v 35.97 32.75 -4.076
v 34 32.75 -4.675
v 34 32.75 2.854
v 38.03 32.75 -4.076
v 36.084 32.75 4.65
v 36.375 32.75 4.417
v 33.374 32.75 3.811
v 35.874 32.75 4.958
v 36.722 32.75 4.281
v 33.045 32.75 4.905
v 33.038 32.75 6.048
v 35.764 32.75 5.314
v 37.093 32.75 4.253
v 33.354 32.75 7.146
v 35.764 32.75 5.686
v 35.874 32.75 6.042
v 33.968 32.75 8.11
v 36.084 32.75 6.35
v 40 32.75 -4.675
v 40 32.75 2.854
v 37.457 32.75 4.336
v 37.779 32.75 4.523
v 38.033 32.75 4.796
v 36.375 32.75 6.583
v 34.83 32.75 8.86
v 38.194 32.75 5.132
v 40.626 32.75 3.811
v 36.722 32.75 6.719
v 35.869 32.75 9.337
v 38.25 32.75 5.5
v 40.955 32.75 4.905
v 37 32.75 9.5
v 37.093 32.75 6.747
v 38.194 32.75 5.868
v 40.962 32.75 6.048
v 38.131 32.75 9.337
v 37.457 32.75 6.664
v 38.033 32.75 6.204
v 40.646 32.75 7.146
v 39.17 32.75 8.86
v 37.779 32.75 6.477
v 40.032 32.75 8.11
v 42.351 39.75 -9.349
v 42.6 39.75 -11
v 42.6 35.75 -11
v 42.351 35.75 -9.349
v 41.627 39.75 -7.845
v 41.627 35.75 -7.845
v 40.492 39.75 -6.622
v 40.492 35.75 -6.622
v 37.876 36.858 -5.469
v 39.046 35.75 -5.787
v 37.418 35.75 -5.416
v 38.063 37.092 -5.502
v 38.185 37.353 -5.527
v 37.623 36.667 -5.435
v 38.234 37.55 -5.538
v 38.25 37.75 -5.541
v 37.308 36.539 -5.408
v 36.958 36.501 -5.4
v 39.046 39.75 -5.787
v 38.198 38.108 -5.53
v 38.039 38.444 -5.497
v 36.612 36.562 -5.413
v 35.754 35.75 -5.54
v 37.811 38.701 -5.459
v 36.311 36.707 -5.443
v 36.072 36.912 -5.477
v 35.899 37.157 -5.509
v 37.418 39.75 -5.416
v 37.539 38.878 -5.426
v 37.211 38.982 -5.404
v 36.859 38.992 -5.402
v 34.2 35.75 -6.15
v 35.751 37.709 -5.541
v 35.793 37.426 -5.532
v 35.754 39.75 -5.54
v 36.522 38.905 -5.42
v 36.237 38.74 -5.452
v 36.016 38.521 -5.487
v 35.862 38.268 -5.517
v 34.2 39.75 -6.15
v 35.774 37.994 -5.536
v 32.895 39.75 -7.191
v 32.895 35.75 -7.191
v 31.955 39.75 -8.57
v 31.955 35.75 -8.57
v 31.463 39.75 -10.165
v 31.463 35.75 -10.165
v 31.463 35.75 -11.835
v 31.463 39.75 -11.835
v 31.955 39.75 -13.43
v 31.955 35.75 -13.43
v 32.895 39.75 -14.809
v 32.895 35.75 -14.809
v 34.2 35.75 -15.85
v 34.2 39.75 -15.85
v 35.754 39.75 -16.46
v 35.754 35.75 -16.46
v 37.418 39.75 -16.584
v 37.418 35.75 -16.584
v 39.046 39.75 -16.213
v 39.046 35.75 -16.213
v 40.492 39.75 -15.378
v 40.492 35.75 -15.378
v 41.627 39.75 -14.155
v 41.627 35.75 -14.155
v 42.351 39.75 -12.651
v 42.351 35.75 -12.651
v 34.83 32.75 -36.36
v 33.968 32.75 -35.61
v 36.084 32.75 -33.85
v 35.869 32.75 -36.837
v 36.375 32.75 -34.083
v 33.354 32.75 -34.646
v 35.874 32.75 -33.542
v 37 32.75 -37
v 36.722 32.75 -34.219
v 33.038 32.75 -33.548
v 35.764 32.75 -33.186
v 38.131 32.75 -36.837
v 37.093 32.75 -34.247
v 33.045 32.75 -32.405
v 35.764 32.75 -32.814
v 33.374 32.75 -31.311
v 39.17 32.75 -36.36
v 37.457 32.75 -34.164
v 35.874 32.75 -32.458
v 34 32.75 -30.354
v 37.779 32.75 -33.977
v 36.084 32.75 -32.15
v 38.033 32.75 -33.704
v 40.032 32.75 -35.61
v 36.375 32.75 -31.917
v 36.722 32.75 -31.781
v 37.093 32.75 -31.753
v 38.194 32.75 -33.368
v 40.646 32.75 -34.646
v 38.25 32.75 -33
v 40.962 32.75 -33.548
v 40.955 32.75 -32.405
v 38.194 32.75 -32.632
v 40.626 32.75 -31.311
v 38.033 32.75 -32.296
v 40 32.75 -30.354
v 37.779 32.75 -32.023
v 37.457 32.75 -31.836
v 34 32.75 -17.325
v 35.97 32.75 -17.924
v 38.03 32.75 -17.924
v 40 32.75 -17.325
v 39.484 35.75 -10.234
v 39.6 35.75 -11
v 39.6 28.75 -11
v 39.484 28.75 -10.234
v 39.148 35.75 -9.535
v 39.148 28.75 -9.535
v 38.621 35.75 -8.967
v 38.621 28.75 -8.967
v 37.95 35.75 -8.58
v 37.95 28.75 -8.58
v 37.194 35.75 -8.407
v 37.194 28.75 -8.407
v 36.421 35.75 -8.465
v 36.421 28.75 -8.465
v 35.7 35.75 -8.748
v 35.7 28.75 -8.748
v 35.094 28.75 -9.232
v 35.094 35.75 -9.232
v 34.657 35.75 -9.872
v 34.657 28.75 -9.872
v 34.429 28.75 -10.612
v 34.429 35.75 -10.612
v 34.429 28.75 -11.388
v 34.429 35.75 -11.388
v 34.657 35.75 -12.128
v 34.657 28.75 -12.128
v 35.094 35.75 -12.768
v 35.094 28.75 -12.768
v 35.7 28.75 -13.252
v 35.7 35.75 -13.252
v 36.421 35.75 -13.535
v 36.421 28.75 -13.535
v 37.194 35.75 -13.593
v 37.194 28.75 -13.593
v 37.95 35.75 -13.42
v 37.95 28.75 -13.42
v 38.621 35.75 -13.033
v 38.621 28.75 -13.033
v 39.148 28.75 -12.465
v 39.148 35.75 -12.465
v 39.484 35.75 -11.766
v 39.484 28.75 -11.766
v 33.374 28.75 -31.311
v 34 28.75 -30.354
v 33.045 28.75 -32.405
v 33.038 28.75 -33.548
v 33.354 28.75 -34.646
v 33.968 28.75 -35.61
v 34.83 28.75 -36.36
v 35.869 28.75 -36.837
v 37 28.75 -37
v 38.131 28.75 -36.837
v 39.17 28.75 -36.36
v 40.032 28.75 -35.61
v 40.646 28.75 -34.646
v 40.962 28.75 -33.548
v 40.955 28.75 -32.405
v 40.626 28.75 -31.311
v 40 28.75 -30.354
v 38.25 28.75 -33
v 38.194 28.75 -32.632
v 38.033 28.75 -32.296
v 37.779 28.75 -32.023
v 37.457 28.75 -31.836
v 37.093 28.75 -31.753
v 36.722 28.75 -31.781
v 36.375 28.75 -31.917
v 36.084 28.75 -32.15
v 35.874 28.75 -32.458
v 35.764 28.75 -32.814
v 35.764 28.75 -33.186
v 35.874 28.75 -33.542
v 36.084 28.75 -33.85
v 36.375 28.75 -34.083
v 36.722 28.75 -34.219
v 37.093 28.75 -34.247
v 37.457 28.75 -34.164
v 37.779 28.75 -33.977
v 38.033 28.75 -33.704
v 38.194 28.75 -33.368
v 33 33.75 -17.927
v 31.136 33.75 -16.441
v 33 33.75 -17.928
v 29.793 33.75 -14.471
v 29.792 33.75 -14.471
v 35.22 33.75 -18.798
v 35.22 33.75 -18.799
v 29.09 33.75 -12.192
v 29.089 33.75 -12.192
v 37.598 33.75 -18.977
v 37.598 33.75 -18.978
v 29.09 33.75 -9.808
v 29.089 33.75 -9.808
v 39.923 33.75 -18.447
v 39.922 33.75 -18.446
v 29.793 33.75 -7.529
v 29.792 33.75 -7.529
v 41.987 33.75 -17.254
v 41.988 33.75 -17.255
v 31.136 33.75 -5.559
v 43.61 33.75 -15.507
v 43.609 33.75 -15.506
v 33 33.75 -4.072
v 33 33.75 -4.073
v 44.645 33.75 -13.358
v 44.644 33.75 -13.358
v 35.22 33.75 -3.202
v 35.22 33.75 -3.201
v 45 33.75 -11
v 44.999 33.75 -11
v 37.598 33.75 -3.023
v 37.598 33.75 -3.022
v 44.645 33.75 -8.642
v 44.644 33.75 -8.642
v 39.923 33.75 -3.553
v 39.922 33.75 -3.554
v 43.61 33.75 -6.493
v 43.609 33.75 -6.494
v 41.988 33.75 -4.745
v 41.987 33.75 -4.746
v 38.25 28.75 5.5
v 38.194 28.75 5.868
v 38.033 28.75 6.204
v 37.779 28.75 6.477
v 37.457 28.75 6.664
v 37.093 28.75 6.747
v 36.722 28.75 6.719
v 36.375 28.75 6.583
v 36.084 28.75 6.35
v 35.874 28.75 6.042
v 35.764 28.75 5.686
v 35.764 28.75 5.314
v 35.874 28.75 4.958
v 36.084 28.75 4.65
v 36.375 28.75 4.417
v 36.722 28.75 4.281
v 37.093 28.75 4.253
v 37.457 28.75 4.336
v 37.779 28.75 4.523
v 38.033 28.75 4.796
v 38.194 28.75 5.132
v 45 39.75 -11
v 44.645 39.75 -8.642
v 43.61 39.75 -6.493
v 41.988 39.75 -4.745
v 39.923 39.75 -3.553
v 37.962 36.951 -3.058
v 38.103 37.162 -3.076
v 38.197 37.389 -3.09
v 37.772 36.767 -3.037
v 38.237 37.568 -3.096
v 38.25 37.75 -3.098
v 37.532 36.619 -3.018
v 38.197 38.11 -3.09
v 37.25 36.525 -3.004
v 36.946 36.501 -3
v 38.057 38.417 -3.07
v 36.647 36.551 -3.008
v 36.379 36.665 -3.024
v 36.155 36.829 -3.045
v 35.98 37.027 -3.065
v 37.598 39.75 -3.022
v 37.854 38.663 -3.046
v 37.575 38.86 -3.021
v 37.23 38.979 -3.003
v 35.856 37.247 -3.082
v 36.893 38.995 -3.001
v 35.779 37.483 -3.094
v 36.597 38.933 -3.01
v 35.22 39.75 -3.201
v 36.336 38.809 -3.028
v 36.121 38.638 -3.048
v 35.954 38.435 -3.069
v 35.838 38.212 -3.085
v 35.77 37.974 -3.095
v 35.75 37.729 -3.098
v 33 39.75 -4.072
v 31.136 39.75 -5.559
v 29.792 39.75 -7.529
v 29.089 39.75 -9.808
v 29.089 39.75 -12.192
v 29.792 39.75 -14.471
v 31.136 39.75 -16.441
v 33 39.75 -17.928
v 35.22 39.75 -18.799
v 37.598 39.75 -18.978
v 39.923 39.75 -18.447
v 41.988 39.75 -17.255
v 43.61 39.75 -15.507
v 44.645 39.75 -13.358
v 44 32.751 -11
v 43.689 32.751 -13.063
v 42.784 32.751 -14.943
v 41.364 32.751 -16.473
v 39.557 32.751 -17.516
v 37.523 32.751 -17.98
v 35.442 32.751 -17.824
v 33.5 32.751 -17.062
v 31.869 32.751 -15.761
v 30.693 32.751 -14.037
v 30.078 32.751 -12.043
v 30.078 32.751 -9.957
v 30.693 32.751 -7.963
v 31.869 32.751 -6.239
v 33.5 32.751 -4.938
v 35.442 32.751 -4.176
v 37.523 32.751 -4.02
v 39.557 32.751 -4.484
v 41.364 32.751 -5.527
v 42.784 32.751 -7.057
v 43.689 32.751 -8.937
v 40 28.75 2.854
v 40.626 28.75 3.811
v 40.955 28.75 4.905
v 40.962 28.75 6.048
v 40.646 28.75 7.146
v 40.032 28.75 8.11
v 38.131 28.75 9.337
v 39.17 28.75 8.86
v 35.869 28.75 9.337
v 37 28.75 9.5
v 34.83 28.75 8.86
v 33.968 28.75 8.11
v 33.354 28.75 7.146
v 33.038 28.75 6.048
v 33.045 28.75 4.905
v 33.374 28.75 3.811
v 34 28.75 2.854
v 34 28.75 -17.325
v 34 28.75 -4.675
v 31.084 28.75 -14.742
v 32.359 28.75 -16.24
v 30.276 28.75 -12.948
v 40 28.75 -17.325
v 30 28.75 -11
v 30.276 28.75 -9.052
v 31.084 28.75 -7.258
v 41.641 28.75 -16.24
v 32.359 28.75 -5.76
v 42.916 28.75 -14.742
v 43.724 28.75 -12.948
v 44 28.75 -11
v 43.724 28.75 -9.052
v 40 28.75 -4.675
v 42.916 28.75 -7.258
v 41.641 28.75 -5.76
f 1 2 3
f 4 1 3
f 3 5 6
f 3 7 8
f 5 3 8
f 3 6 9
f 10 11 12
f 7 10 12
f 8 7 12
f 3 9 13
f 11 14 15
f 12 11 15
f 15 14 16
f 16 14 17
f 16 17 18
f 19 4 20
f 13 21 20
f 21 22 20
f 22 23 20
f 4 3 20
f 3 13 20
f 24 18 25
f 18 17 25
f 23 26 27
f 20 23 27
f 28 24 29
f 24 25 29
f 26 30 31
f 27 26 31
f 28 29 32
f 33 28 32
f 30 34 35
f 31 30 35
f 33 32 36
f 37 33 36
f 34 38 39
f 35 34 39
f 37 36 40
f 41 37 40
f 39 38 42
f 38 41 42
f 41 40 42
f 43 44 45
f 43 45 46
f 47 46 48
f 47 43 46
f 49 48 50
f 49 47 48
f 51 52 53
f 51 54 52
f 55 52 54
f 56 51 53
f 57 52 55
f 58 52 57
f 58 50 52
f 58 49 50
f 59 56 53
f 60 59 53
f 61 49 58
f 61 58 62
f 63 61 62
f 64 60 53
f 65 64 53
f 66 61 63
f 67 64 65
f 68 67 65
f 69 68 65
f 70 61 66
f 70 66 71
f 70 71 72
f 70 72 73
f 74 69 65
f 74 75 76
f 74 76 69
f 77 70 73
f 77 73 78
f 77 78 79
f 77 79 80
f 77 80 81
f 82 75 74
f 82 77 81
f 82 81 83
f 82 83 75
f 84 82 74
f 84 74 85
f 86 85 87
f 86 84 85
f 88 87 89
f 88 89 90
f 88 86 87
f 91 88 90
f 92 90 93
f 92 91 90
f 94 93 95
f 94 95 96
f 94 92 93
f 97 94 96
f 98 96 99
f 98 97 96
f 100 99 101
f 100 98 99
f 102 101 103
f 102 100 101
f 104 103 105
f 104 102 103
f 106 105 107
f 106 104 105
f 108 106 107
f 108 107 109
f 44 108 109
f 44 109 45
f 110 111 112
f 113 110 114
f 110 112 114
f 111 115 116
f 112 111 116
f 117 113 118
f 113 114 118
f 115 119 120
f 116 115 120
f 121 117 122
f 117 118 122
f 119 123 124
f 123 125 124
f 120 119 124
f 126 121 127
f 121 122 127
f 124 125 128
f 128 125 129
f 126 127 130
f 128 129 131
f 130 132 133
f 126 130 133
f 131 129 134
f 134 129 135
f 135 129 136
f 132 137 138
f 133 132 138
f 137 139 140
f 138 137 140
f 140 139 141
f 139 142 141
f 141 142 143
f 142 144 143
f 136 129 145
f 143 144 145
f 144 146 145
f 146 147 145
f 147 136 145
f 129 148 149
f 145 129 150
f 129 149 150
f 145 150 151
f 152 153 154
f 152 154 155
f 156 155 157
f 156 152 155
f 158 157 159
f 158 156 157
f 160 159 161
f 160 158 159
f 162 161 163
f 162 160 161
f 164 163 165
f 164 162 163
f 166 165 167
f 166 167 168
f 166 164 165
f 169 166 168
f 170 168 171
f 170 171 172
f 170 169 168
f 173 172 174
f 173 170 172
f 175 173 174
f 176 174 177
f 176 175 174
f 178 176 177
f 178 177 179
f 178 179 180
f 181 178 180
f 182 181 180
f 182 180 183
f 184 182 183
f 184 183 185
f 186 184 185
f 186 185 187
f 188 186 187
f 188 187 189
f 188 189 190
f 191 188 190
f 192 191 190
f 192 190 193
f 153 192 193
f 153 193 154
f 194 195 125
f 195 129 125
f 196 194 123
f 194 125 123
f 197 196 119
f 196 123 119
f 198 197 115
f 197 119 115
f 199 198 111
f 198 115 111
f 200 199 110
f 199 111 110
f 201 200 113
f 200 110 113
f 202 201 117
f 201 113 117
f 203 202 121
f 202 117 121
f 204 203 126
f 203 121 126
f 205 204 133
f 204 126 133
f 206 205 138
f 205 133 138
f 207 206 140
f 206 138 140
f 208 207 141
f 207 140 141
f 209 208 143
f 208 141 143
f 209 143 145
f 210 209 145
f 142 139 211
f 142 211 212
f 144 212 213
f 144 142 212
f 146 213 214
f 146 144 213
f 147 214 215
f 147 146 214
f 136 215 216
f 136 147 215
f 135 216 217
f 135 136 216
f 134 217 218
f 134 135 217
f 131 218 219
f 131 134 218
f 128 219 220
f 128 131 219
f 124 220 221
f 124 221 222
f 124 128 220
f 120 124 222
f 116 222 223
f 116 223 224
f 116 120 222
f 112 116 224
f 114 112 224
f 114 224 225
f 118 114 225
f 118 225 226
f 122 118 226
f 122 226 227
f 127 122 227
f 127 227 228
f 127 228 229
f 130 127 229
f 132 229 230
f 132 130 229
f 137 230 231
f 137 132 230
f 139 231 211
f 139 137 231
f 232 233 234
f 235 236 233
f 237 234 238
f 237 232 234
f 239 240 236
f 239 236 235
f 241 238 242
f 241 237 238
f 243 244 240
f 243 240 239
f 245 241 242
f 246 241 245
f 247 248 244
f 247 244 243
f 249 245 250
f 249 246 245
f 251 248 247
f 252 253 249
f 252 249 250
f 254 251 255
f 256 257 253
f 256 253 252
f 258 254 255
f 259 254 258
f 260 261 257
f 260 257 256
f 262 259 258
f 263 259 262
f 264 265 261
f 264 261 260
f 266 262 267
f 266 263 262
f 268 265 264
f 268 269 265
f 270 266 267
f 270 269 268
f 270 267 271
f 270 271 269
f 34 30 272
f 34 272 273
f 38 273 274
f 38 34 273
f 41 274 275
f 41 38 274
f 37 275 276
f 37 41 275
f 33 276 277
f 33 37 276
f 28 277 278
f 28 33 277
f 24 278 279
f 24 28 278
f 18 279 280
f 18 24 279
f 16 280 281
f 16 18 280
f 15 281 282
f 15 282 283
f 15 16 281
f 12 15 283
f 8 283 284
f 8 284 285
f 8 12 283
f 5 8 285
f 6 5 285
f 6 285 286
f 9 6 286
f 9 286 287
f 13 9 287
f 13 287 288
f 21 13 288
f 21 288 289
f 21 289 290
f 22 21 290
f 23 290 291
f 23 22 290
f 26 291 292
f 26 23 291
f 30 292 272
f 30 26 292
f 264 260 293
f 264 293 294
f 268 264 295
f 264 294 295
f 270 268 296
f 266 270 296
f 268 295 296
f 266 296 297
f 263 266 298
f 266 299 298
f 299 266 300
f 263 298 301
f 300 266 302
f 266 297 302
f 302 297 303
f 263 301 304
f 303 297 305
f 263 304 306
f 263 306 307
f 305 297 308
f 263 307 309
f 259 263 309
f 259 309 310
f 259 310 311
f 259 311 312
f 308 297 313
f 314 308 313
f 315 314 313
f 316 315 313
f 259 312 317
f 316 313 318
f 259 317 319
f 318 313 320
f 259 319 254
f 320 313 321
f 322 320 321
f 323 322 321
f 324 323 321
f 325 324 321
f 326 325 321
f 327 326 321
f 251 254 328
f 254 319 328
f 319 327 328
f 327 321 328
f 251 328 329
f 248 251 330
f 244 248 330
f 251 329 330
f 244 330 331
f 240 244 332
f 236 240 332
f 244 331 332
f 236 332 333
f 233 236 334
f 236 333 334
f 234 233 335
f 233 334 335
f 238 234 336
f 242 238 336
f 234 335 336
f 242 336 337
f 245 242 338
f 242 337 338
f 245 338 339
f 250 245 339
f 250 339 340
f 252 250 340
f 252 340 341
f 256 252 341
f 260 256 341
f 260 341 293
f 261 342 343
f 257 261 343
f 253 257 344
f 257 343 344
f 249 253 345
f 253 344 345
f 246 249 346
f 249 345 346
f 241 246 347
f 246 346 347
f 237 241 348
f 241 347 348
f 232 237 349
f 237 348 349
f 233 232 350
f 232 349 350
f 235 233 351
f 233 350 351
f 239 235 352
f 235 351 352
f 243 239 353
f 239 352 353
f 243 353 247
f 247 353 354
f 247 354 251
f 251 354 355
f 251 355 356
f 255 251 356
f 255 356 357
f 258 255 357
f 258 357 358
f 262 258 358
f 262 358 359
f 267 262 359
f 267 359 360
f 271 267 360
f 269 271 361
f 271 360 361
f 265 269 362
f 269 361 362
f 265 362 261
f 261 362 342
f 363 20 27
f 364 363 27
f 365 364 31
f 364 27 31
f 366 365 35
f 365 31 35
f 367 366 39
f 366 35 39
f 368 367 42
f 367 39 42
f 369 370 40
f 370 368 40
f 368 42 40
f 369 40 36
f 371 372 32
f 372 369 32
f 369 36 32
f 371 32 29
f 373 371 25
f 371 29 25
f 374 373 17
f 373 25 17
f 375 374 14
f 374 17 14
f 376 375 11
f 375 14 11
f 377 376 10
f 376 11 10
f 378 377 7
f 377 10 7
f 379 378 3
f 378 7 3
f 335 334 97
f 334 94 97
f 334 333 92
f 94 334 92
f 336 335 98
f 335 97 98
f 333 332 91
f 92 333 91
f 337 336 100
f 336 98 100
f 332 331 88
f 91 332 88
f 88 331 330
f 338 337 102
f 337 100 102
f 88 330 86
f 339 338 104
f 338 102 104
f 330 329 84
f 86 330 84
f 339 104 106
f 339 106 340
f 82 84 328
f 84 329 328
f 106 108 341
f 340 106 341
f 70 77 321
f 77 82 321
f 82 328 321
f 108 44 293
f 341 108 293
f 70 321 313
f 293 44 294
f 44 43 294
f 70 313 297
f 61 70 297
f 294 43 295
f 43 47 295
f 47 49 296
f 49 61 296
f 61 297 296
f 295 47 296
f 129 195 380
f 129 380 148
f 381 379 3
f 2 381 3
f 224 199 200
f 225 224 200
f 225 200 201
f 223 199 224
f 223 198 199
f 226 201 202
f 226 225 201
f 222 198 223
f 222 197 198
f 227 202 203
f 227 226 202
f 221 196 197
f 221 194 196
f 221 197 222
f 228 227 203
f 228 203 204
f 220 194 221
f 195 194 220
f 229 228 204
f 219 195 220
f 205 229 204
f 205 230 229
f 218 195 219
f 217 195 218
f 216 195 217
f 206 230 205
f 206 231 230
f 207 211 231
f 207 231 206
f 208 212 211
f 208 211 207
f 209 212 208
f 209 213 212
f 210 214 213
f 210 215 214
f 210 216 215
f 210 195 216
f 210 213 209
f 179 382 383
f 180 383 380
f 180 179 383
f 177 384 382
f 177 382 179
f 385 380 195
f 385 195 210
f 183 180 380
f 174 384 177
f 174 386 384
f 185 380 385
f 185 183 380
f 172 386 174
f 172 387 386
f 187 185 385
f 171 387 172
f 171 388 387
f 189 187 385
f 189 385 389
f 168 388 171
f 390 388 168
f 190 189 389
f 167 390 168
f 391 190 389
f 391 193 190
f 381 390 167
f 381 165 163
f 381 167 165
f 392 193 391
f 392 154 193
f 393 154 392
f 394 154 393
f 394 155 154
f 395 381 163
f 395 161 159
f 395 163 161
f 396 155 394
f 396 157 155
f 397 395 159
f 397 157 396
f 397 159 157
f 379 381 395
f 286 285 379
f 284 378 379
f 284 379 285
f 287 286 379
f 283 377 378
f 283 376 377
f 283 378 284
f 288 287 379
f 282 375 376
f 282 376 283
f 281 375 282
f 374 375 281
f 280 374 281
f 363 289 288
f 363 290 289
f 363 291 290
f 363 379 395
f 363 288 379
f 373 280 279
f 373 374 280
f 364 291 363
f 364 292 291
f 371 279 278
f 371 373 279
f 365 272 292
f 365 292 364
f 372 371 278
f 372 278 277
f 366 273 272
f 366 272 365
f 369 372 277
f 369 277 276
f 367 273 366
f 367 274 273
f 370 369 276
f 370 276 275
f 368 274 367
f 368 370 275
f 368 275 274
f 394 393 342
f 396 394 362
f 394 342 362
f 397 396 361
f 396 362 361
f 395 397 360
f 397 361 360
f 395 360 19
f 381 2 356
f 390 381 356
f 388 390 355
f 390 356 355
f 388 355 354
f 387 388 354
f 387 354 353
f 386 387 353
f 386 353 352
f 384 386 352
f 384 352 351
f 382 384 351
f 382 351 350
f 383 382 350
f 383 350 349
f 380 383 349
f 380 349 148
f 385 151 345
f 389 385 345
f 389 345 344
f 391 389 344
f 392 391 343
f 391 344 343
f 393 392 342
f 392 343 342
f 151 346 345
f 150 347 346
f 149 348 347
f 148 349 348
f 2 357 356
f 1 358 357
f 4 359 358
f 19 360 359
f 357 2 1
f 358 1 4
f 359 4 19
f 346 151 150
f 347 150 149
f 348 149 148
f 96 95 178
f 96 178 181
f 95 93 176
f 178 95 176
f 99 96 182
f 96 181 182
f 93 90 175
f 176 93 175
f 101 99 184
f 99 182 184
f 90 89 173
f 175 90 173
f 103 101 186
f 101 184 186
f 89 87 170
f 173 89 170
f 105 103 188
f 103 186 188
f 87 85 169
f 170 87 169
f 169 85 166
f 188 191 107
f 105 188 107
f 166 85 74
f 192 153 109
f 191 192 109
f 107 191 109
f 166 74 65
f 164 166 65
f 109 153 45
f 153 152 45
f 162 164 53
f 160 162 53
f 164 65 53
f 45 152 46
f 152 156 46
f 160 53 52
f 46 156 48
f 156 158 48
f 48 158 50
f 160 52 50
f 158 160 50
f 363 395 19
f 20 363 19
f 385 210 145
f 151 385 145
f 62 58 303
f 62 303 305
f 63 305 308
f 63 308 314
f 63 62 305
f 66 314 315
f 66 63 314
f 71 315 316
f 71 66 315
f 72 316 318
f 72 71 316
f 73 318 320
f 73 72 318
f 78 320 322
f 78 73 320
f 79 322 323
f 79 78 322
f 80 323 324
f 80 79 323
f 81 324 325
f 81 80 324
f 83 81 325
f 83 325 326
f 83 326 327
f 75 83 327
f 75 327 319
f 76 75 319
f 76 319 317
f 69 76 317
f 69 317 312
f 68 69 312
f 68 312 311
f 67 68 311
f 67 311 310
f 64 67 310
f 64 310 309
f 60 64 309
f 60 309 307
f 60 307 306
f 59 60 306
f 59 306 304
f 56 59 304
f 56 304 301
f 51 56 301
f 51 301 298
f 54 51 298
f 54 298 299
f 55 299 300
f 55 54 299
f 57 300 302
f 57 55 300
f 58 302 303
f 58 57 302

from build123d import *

# Parameters (mm, degrees)
CYLINDER975_R          = 1.25
CYLINDER975_DEPTH      = 4
CYLINDER975_ROLL_ANGLE = 90
CYLINDER979_R          = 1.25
CYLINDER979_DEPTH      = 7
CYLINDER977_R          = 2.6
CYLINDER977_DEPTH      = 11
CYLINDER977_ROLL_ANGLE = 90
CYLINDER981_R          = 1.25
CYLINDER981_DEPTH      = 4
CYLINDER981_ROLL_ANGLE = 90
CYLINDER976_R          = 5.6
CYLINDER976_DEPTH      = 4
CYLINDER976_ROLL_ANGLE = 90
CYLINDER978_R          = 8
CYLINDER978_DEPTH      = 6
CYLINDER978_ROLL_ANGLE = 90
BOX566_W               = 6
BOX566_H               = 4
BOX566_DEPTH           = 16.5
CYLINDER973_R          = 7
CYLINDER973_DEPTH      = 6
CYLINDER973_ROLL_ANGLE = 90
BOX565_W               = 6
BOX565_H               = 4
BOX565_DEPTH           = 22
CYLINDER980_R          = 4
CYLINDER980_DEPTH      = 4
CYLINDER980_ROLL_ANGLE = 90
CYLINDER974_R          = 4
CYLINDER974_DEPTH      = 4
CYLINDER974_ROLL_ANGLE = 90
CHAMFER106_SIZE        = 0.999


with BuildPart() as cylinder1154:
    # Cylinder975 → Cylinder975 (new body)
    with BuildSketch(Plane.XY):
        Circle(CYLINDER975_R)
    extrude(amount=CYLINDER975_DEPTH)


with BuildPart() as cylinder1154_1:
    # Cylinder975 roll: moved
    add(cylinder1154.part.rotate(Axis((0, 0, 0), (1, 0, 0)), CYLINDER975_ROLL_ANGLE))


with BuildPart() as cylinder1154_2:
    # Cylinder975 placement: moved
    add(cylinder1154_1.part.moved(Location((37, 32.75, -33))))


with BuildPart() as cylinder1158:
    # Cylinder979 → Cylinder979 (new body)
    with BuildSketch(Plane(origin=(37, 37.75, -8), x_dir=(1, 0, 0), z_dir=(0, 0, 1))):
        Circle(CYLINDER979_R)
    extrude(amount=CYLINDER979_DEPTH)


with BuildPart() as cylinder1156:
    # Cylinder977 → Cylinder977 (new body)
    with BuildSketch(Plane.XY):
        Circle(CYLINDER977_R)
    extrude(amount=CYLINDER977_DEPTH)


with BuildPart() as cylinder1156_1:
    # Cylinder977 roll: moved
    add(cylinder1156.part.rotate(Axis((0, 0, 0), (1, 0, 0)), CYLINDER977_ROLL_ANGLE))


with BuildPart() as cylinder1156_2:
    # Cylinder977 placement: moved
    add(cylinder1156_1.part.moved(Location((37, 39.75, -11))))


with BuildPart() as cylinder1160:
    # Cylinder981 → Cylinder981 (new body)
    with BuildSketch(Plane.XY):
        Circle(CYLINDER981_R)
    extrude(amount=CYLINDER981_DEPTH)


with BuildPart() as cylinder1160_1:
    # Cylinder981 roll: moved
    add(cylinder1160.part.rotate(Axis((0, 0, 0), (1, 0, 0)), CYLINDER981_ROLL_ANGLE))


with BuildPart() as cylinder1160_2:
    # Cylinder981 placement: moved
    add(cylinder1160_1.part.moved(Location((37, 32.75, 5.5))))


with BuildPart() as fusion612:
    # Cylinder976 → Cylinder976 (new body)
    with BuildSketch(Plane.XY):
        Circle(CYLINDER976_R)
    extrude(amount=CYLINDER976_DEPTH)


with BuildPart() as fusion612_1:
    # Cylinder976 roll: moved
    add(fusion612.part.rotate(Axis((0, 0, 0), (1, 0, 0)), CYLINDER976_ROLL_ANGLE))


with BuildPart() as fusion612_2:
    # Cylinder976 placement: moved
    add(fusion612_1.part.moved(Location((37, 39.75, -11))))

    # Fusion612: union Cylinder1154, Cylinder1158, Cylinder1156, Cylinder1160
    add(cylinder1154_2.part)
    add(cylinder1158.part)
    add(cylinder1156_2.part)
    add(cylinder1160_2.part)


with BuildPart() as cylinder1157:
    # Cylinder978 → Cylinder978 (new body)
    with BuildSketch(Plane.XY):
        Circle(CYLINDER978_R)
    extrude(amount=CYLINDER978_DEPTH)


with BuildPart() as cylinder1157_1:
    # Cylinder978 roll: moved
    add(cylinder1157.part.rotate(Axis((0, 0, 0), (1, 0, 0)), CYLINDER978_ROLL_ANGLE))


with BuildPart() as cylinder1157_2:
    # Cylinder978 placement: moved
    add(cylinder1157_1.part.moved(Location((37, 39.75, -11))))


with BuildPart() as cube757:
    # Box566 → Box566 (new body)
    with BuildSketch(Plane(origin=(34, 33.75, -11), x_dir=(1, 0, 0), z_dir=(0, 0, 1))):
        with Locations((3, 2)):
            Rectangle(BOX566_W, BOX566_H)
    extrude(amount=BOX566_DEPTH)


with BuildPart() as cylinder1152:
    # Cylinder973 → Cylinder973 (new body)
    with BuildSketch(Plane.XY):
        Circle(CYLINDER973_R)
    extrude(amount=CYLINDER973_DEPTH)


with BuildPart() as cylinder1152_1:
    # Cylinder973 roll: moved
    add(cylinder1152.part.rotate(Axis((0, 0, 0), (1, 0, 0)), CYLINDER973_ROLL_ANGLE))


with BuildPart() as cylinder1152_2:
    # Cylinder973 placement: moved
    add(cylinder1152_1.part.moved(Location((37, 39.75, -11))))


with BuildPart() as cube756:
    # Box565 → Box565 (new body)
    with BuildSketch(Plane(origin=(34, 33.75, -33), x_dir=(1, 0, 0), z_dir=(0, 0, 1))):
        with Locations((3, 2)):
            Rectangle(BOX565_W, BOX565_H)
    extrude(amount=BOX565_DEPTH)


with BuildPart() as cylinder1159:
    # Cylinder980 → Cylinder980 (new body)
    with BuildSketch(Plane.XY):
        Circle(CYLINDER980_R)
    extrude(amount=CYLINDER980_DEPTH)


with BuildPart() as cylinder1159_1:
    # Cylinder980 roll: moved
    add(cylinder1159.part.rotate(Axis((0, 0, 0), (1, 0, 0)), CYLINDER980_ROLL_ANGLE))


with BuildPart() as cylinder1159_2:
    # Cylinder980 placement: moved
    add(cylinder1159_1.part.moved(Location((37, 37.75, 5.5))))


with BuildPart() as front_axle_steering_arm_with_rear_link:
    # Cylinder974 → Cylinder974 (new body)
    with BuildSketch(Plane.XY):
        Circle(CYLINDER974_R)
    extrude(amount=CYLINDER974_DEPTH)


with BuildPart() as front_axle_steering_arm_with_rear_link_1:
    # Cylinder974 roll: moved
    add(front_axle_steering_arm_with_rear_link.part.rotate(Axis((0, 0, 0), (1, 0, 0)), CYLINDER974_ROLL_ANGLE))


with BuildPart() as front_axle_steering_arm_with_rear_link_2:
    # Cylinder974 placement: moved
    add(front_axle_steering_arm_with_rear_link_1.part.moved(Location((37, 37.75, -33))))

    # Fusion611: union Cube757, Cylinder1152, Cube756, Cylinder1159
    add(cube757.part)
    add(cylinder1152_2.part)
    add(cube756.part)
    add(cylinder1159_2.part)


with BuildPart() as front_axle_steering_arm_with_rear_link_3:
    # Fusion611 placement: moved
    add(front_axle_steering_arm_with_rear_link_2.part.moved(Location((0, -5, 0))))

    # Fusion613: union Cylinder1157
    add(cylinder1157_2.part)

    # Cut702: cut Fusion612
    add(fusion612_2.part, mode=Mode.SUBTRACT)

    # Chamfer106
    chamfer106_edges = [front_axle_steering_arm_with_rear_link_3.edges().sort_by_distance(p)[0] for p in [
        (30, 33.75, -11),
    ]]
    chamfer(chamfer106_edges, length=CHAMFER106_SIZE)


solid = front_axle_steering_arm_with_rear_link_3.part
